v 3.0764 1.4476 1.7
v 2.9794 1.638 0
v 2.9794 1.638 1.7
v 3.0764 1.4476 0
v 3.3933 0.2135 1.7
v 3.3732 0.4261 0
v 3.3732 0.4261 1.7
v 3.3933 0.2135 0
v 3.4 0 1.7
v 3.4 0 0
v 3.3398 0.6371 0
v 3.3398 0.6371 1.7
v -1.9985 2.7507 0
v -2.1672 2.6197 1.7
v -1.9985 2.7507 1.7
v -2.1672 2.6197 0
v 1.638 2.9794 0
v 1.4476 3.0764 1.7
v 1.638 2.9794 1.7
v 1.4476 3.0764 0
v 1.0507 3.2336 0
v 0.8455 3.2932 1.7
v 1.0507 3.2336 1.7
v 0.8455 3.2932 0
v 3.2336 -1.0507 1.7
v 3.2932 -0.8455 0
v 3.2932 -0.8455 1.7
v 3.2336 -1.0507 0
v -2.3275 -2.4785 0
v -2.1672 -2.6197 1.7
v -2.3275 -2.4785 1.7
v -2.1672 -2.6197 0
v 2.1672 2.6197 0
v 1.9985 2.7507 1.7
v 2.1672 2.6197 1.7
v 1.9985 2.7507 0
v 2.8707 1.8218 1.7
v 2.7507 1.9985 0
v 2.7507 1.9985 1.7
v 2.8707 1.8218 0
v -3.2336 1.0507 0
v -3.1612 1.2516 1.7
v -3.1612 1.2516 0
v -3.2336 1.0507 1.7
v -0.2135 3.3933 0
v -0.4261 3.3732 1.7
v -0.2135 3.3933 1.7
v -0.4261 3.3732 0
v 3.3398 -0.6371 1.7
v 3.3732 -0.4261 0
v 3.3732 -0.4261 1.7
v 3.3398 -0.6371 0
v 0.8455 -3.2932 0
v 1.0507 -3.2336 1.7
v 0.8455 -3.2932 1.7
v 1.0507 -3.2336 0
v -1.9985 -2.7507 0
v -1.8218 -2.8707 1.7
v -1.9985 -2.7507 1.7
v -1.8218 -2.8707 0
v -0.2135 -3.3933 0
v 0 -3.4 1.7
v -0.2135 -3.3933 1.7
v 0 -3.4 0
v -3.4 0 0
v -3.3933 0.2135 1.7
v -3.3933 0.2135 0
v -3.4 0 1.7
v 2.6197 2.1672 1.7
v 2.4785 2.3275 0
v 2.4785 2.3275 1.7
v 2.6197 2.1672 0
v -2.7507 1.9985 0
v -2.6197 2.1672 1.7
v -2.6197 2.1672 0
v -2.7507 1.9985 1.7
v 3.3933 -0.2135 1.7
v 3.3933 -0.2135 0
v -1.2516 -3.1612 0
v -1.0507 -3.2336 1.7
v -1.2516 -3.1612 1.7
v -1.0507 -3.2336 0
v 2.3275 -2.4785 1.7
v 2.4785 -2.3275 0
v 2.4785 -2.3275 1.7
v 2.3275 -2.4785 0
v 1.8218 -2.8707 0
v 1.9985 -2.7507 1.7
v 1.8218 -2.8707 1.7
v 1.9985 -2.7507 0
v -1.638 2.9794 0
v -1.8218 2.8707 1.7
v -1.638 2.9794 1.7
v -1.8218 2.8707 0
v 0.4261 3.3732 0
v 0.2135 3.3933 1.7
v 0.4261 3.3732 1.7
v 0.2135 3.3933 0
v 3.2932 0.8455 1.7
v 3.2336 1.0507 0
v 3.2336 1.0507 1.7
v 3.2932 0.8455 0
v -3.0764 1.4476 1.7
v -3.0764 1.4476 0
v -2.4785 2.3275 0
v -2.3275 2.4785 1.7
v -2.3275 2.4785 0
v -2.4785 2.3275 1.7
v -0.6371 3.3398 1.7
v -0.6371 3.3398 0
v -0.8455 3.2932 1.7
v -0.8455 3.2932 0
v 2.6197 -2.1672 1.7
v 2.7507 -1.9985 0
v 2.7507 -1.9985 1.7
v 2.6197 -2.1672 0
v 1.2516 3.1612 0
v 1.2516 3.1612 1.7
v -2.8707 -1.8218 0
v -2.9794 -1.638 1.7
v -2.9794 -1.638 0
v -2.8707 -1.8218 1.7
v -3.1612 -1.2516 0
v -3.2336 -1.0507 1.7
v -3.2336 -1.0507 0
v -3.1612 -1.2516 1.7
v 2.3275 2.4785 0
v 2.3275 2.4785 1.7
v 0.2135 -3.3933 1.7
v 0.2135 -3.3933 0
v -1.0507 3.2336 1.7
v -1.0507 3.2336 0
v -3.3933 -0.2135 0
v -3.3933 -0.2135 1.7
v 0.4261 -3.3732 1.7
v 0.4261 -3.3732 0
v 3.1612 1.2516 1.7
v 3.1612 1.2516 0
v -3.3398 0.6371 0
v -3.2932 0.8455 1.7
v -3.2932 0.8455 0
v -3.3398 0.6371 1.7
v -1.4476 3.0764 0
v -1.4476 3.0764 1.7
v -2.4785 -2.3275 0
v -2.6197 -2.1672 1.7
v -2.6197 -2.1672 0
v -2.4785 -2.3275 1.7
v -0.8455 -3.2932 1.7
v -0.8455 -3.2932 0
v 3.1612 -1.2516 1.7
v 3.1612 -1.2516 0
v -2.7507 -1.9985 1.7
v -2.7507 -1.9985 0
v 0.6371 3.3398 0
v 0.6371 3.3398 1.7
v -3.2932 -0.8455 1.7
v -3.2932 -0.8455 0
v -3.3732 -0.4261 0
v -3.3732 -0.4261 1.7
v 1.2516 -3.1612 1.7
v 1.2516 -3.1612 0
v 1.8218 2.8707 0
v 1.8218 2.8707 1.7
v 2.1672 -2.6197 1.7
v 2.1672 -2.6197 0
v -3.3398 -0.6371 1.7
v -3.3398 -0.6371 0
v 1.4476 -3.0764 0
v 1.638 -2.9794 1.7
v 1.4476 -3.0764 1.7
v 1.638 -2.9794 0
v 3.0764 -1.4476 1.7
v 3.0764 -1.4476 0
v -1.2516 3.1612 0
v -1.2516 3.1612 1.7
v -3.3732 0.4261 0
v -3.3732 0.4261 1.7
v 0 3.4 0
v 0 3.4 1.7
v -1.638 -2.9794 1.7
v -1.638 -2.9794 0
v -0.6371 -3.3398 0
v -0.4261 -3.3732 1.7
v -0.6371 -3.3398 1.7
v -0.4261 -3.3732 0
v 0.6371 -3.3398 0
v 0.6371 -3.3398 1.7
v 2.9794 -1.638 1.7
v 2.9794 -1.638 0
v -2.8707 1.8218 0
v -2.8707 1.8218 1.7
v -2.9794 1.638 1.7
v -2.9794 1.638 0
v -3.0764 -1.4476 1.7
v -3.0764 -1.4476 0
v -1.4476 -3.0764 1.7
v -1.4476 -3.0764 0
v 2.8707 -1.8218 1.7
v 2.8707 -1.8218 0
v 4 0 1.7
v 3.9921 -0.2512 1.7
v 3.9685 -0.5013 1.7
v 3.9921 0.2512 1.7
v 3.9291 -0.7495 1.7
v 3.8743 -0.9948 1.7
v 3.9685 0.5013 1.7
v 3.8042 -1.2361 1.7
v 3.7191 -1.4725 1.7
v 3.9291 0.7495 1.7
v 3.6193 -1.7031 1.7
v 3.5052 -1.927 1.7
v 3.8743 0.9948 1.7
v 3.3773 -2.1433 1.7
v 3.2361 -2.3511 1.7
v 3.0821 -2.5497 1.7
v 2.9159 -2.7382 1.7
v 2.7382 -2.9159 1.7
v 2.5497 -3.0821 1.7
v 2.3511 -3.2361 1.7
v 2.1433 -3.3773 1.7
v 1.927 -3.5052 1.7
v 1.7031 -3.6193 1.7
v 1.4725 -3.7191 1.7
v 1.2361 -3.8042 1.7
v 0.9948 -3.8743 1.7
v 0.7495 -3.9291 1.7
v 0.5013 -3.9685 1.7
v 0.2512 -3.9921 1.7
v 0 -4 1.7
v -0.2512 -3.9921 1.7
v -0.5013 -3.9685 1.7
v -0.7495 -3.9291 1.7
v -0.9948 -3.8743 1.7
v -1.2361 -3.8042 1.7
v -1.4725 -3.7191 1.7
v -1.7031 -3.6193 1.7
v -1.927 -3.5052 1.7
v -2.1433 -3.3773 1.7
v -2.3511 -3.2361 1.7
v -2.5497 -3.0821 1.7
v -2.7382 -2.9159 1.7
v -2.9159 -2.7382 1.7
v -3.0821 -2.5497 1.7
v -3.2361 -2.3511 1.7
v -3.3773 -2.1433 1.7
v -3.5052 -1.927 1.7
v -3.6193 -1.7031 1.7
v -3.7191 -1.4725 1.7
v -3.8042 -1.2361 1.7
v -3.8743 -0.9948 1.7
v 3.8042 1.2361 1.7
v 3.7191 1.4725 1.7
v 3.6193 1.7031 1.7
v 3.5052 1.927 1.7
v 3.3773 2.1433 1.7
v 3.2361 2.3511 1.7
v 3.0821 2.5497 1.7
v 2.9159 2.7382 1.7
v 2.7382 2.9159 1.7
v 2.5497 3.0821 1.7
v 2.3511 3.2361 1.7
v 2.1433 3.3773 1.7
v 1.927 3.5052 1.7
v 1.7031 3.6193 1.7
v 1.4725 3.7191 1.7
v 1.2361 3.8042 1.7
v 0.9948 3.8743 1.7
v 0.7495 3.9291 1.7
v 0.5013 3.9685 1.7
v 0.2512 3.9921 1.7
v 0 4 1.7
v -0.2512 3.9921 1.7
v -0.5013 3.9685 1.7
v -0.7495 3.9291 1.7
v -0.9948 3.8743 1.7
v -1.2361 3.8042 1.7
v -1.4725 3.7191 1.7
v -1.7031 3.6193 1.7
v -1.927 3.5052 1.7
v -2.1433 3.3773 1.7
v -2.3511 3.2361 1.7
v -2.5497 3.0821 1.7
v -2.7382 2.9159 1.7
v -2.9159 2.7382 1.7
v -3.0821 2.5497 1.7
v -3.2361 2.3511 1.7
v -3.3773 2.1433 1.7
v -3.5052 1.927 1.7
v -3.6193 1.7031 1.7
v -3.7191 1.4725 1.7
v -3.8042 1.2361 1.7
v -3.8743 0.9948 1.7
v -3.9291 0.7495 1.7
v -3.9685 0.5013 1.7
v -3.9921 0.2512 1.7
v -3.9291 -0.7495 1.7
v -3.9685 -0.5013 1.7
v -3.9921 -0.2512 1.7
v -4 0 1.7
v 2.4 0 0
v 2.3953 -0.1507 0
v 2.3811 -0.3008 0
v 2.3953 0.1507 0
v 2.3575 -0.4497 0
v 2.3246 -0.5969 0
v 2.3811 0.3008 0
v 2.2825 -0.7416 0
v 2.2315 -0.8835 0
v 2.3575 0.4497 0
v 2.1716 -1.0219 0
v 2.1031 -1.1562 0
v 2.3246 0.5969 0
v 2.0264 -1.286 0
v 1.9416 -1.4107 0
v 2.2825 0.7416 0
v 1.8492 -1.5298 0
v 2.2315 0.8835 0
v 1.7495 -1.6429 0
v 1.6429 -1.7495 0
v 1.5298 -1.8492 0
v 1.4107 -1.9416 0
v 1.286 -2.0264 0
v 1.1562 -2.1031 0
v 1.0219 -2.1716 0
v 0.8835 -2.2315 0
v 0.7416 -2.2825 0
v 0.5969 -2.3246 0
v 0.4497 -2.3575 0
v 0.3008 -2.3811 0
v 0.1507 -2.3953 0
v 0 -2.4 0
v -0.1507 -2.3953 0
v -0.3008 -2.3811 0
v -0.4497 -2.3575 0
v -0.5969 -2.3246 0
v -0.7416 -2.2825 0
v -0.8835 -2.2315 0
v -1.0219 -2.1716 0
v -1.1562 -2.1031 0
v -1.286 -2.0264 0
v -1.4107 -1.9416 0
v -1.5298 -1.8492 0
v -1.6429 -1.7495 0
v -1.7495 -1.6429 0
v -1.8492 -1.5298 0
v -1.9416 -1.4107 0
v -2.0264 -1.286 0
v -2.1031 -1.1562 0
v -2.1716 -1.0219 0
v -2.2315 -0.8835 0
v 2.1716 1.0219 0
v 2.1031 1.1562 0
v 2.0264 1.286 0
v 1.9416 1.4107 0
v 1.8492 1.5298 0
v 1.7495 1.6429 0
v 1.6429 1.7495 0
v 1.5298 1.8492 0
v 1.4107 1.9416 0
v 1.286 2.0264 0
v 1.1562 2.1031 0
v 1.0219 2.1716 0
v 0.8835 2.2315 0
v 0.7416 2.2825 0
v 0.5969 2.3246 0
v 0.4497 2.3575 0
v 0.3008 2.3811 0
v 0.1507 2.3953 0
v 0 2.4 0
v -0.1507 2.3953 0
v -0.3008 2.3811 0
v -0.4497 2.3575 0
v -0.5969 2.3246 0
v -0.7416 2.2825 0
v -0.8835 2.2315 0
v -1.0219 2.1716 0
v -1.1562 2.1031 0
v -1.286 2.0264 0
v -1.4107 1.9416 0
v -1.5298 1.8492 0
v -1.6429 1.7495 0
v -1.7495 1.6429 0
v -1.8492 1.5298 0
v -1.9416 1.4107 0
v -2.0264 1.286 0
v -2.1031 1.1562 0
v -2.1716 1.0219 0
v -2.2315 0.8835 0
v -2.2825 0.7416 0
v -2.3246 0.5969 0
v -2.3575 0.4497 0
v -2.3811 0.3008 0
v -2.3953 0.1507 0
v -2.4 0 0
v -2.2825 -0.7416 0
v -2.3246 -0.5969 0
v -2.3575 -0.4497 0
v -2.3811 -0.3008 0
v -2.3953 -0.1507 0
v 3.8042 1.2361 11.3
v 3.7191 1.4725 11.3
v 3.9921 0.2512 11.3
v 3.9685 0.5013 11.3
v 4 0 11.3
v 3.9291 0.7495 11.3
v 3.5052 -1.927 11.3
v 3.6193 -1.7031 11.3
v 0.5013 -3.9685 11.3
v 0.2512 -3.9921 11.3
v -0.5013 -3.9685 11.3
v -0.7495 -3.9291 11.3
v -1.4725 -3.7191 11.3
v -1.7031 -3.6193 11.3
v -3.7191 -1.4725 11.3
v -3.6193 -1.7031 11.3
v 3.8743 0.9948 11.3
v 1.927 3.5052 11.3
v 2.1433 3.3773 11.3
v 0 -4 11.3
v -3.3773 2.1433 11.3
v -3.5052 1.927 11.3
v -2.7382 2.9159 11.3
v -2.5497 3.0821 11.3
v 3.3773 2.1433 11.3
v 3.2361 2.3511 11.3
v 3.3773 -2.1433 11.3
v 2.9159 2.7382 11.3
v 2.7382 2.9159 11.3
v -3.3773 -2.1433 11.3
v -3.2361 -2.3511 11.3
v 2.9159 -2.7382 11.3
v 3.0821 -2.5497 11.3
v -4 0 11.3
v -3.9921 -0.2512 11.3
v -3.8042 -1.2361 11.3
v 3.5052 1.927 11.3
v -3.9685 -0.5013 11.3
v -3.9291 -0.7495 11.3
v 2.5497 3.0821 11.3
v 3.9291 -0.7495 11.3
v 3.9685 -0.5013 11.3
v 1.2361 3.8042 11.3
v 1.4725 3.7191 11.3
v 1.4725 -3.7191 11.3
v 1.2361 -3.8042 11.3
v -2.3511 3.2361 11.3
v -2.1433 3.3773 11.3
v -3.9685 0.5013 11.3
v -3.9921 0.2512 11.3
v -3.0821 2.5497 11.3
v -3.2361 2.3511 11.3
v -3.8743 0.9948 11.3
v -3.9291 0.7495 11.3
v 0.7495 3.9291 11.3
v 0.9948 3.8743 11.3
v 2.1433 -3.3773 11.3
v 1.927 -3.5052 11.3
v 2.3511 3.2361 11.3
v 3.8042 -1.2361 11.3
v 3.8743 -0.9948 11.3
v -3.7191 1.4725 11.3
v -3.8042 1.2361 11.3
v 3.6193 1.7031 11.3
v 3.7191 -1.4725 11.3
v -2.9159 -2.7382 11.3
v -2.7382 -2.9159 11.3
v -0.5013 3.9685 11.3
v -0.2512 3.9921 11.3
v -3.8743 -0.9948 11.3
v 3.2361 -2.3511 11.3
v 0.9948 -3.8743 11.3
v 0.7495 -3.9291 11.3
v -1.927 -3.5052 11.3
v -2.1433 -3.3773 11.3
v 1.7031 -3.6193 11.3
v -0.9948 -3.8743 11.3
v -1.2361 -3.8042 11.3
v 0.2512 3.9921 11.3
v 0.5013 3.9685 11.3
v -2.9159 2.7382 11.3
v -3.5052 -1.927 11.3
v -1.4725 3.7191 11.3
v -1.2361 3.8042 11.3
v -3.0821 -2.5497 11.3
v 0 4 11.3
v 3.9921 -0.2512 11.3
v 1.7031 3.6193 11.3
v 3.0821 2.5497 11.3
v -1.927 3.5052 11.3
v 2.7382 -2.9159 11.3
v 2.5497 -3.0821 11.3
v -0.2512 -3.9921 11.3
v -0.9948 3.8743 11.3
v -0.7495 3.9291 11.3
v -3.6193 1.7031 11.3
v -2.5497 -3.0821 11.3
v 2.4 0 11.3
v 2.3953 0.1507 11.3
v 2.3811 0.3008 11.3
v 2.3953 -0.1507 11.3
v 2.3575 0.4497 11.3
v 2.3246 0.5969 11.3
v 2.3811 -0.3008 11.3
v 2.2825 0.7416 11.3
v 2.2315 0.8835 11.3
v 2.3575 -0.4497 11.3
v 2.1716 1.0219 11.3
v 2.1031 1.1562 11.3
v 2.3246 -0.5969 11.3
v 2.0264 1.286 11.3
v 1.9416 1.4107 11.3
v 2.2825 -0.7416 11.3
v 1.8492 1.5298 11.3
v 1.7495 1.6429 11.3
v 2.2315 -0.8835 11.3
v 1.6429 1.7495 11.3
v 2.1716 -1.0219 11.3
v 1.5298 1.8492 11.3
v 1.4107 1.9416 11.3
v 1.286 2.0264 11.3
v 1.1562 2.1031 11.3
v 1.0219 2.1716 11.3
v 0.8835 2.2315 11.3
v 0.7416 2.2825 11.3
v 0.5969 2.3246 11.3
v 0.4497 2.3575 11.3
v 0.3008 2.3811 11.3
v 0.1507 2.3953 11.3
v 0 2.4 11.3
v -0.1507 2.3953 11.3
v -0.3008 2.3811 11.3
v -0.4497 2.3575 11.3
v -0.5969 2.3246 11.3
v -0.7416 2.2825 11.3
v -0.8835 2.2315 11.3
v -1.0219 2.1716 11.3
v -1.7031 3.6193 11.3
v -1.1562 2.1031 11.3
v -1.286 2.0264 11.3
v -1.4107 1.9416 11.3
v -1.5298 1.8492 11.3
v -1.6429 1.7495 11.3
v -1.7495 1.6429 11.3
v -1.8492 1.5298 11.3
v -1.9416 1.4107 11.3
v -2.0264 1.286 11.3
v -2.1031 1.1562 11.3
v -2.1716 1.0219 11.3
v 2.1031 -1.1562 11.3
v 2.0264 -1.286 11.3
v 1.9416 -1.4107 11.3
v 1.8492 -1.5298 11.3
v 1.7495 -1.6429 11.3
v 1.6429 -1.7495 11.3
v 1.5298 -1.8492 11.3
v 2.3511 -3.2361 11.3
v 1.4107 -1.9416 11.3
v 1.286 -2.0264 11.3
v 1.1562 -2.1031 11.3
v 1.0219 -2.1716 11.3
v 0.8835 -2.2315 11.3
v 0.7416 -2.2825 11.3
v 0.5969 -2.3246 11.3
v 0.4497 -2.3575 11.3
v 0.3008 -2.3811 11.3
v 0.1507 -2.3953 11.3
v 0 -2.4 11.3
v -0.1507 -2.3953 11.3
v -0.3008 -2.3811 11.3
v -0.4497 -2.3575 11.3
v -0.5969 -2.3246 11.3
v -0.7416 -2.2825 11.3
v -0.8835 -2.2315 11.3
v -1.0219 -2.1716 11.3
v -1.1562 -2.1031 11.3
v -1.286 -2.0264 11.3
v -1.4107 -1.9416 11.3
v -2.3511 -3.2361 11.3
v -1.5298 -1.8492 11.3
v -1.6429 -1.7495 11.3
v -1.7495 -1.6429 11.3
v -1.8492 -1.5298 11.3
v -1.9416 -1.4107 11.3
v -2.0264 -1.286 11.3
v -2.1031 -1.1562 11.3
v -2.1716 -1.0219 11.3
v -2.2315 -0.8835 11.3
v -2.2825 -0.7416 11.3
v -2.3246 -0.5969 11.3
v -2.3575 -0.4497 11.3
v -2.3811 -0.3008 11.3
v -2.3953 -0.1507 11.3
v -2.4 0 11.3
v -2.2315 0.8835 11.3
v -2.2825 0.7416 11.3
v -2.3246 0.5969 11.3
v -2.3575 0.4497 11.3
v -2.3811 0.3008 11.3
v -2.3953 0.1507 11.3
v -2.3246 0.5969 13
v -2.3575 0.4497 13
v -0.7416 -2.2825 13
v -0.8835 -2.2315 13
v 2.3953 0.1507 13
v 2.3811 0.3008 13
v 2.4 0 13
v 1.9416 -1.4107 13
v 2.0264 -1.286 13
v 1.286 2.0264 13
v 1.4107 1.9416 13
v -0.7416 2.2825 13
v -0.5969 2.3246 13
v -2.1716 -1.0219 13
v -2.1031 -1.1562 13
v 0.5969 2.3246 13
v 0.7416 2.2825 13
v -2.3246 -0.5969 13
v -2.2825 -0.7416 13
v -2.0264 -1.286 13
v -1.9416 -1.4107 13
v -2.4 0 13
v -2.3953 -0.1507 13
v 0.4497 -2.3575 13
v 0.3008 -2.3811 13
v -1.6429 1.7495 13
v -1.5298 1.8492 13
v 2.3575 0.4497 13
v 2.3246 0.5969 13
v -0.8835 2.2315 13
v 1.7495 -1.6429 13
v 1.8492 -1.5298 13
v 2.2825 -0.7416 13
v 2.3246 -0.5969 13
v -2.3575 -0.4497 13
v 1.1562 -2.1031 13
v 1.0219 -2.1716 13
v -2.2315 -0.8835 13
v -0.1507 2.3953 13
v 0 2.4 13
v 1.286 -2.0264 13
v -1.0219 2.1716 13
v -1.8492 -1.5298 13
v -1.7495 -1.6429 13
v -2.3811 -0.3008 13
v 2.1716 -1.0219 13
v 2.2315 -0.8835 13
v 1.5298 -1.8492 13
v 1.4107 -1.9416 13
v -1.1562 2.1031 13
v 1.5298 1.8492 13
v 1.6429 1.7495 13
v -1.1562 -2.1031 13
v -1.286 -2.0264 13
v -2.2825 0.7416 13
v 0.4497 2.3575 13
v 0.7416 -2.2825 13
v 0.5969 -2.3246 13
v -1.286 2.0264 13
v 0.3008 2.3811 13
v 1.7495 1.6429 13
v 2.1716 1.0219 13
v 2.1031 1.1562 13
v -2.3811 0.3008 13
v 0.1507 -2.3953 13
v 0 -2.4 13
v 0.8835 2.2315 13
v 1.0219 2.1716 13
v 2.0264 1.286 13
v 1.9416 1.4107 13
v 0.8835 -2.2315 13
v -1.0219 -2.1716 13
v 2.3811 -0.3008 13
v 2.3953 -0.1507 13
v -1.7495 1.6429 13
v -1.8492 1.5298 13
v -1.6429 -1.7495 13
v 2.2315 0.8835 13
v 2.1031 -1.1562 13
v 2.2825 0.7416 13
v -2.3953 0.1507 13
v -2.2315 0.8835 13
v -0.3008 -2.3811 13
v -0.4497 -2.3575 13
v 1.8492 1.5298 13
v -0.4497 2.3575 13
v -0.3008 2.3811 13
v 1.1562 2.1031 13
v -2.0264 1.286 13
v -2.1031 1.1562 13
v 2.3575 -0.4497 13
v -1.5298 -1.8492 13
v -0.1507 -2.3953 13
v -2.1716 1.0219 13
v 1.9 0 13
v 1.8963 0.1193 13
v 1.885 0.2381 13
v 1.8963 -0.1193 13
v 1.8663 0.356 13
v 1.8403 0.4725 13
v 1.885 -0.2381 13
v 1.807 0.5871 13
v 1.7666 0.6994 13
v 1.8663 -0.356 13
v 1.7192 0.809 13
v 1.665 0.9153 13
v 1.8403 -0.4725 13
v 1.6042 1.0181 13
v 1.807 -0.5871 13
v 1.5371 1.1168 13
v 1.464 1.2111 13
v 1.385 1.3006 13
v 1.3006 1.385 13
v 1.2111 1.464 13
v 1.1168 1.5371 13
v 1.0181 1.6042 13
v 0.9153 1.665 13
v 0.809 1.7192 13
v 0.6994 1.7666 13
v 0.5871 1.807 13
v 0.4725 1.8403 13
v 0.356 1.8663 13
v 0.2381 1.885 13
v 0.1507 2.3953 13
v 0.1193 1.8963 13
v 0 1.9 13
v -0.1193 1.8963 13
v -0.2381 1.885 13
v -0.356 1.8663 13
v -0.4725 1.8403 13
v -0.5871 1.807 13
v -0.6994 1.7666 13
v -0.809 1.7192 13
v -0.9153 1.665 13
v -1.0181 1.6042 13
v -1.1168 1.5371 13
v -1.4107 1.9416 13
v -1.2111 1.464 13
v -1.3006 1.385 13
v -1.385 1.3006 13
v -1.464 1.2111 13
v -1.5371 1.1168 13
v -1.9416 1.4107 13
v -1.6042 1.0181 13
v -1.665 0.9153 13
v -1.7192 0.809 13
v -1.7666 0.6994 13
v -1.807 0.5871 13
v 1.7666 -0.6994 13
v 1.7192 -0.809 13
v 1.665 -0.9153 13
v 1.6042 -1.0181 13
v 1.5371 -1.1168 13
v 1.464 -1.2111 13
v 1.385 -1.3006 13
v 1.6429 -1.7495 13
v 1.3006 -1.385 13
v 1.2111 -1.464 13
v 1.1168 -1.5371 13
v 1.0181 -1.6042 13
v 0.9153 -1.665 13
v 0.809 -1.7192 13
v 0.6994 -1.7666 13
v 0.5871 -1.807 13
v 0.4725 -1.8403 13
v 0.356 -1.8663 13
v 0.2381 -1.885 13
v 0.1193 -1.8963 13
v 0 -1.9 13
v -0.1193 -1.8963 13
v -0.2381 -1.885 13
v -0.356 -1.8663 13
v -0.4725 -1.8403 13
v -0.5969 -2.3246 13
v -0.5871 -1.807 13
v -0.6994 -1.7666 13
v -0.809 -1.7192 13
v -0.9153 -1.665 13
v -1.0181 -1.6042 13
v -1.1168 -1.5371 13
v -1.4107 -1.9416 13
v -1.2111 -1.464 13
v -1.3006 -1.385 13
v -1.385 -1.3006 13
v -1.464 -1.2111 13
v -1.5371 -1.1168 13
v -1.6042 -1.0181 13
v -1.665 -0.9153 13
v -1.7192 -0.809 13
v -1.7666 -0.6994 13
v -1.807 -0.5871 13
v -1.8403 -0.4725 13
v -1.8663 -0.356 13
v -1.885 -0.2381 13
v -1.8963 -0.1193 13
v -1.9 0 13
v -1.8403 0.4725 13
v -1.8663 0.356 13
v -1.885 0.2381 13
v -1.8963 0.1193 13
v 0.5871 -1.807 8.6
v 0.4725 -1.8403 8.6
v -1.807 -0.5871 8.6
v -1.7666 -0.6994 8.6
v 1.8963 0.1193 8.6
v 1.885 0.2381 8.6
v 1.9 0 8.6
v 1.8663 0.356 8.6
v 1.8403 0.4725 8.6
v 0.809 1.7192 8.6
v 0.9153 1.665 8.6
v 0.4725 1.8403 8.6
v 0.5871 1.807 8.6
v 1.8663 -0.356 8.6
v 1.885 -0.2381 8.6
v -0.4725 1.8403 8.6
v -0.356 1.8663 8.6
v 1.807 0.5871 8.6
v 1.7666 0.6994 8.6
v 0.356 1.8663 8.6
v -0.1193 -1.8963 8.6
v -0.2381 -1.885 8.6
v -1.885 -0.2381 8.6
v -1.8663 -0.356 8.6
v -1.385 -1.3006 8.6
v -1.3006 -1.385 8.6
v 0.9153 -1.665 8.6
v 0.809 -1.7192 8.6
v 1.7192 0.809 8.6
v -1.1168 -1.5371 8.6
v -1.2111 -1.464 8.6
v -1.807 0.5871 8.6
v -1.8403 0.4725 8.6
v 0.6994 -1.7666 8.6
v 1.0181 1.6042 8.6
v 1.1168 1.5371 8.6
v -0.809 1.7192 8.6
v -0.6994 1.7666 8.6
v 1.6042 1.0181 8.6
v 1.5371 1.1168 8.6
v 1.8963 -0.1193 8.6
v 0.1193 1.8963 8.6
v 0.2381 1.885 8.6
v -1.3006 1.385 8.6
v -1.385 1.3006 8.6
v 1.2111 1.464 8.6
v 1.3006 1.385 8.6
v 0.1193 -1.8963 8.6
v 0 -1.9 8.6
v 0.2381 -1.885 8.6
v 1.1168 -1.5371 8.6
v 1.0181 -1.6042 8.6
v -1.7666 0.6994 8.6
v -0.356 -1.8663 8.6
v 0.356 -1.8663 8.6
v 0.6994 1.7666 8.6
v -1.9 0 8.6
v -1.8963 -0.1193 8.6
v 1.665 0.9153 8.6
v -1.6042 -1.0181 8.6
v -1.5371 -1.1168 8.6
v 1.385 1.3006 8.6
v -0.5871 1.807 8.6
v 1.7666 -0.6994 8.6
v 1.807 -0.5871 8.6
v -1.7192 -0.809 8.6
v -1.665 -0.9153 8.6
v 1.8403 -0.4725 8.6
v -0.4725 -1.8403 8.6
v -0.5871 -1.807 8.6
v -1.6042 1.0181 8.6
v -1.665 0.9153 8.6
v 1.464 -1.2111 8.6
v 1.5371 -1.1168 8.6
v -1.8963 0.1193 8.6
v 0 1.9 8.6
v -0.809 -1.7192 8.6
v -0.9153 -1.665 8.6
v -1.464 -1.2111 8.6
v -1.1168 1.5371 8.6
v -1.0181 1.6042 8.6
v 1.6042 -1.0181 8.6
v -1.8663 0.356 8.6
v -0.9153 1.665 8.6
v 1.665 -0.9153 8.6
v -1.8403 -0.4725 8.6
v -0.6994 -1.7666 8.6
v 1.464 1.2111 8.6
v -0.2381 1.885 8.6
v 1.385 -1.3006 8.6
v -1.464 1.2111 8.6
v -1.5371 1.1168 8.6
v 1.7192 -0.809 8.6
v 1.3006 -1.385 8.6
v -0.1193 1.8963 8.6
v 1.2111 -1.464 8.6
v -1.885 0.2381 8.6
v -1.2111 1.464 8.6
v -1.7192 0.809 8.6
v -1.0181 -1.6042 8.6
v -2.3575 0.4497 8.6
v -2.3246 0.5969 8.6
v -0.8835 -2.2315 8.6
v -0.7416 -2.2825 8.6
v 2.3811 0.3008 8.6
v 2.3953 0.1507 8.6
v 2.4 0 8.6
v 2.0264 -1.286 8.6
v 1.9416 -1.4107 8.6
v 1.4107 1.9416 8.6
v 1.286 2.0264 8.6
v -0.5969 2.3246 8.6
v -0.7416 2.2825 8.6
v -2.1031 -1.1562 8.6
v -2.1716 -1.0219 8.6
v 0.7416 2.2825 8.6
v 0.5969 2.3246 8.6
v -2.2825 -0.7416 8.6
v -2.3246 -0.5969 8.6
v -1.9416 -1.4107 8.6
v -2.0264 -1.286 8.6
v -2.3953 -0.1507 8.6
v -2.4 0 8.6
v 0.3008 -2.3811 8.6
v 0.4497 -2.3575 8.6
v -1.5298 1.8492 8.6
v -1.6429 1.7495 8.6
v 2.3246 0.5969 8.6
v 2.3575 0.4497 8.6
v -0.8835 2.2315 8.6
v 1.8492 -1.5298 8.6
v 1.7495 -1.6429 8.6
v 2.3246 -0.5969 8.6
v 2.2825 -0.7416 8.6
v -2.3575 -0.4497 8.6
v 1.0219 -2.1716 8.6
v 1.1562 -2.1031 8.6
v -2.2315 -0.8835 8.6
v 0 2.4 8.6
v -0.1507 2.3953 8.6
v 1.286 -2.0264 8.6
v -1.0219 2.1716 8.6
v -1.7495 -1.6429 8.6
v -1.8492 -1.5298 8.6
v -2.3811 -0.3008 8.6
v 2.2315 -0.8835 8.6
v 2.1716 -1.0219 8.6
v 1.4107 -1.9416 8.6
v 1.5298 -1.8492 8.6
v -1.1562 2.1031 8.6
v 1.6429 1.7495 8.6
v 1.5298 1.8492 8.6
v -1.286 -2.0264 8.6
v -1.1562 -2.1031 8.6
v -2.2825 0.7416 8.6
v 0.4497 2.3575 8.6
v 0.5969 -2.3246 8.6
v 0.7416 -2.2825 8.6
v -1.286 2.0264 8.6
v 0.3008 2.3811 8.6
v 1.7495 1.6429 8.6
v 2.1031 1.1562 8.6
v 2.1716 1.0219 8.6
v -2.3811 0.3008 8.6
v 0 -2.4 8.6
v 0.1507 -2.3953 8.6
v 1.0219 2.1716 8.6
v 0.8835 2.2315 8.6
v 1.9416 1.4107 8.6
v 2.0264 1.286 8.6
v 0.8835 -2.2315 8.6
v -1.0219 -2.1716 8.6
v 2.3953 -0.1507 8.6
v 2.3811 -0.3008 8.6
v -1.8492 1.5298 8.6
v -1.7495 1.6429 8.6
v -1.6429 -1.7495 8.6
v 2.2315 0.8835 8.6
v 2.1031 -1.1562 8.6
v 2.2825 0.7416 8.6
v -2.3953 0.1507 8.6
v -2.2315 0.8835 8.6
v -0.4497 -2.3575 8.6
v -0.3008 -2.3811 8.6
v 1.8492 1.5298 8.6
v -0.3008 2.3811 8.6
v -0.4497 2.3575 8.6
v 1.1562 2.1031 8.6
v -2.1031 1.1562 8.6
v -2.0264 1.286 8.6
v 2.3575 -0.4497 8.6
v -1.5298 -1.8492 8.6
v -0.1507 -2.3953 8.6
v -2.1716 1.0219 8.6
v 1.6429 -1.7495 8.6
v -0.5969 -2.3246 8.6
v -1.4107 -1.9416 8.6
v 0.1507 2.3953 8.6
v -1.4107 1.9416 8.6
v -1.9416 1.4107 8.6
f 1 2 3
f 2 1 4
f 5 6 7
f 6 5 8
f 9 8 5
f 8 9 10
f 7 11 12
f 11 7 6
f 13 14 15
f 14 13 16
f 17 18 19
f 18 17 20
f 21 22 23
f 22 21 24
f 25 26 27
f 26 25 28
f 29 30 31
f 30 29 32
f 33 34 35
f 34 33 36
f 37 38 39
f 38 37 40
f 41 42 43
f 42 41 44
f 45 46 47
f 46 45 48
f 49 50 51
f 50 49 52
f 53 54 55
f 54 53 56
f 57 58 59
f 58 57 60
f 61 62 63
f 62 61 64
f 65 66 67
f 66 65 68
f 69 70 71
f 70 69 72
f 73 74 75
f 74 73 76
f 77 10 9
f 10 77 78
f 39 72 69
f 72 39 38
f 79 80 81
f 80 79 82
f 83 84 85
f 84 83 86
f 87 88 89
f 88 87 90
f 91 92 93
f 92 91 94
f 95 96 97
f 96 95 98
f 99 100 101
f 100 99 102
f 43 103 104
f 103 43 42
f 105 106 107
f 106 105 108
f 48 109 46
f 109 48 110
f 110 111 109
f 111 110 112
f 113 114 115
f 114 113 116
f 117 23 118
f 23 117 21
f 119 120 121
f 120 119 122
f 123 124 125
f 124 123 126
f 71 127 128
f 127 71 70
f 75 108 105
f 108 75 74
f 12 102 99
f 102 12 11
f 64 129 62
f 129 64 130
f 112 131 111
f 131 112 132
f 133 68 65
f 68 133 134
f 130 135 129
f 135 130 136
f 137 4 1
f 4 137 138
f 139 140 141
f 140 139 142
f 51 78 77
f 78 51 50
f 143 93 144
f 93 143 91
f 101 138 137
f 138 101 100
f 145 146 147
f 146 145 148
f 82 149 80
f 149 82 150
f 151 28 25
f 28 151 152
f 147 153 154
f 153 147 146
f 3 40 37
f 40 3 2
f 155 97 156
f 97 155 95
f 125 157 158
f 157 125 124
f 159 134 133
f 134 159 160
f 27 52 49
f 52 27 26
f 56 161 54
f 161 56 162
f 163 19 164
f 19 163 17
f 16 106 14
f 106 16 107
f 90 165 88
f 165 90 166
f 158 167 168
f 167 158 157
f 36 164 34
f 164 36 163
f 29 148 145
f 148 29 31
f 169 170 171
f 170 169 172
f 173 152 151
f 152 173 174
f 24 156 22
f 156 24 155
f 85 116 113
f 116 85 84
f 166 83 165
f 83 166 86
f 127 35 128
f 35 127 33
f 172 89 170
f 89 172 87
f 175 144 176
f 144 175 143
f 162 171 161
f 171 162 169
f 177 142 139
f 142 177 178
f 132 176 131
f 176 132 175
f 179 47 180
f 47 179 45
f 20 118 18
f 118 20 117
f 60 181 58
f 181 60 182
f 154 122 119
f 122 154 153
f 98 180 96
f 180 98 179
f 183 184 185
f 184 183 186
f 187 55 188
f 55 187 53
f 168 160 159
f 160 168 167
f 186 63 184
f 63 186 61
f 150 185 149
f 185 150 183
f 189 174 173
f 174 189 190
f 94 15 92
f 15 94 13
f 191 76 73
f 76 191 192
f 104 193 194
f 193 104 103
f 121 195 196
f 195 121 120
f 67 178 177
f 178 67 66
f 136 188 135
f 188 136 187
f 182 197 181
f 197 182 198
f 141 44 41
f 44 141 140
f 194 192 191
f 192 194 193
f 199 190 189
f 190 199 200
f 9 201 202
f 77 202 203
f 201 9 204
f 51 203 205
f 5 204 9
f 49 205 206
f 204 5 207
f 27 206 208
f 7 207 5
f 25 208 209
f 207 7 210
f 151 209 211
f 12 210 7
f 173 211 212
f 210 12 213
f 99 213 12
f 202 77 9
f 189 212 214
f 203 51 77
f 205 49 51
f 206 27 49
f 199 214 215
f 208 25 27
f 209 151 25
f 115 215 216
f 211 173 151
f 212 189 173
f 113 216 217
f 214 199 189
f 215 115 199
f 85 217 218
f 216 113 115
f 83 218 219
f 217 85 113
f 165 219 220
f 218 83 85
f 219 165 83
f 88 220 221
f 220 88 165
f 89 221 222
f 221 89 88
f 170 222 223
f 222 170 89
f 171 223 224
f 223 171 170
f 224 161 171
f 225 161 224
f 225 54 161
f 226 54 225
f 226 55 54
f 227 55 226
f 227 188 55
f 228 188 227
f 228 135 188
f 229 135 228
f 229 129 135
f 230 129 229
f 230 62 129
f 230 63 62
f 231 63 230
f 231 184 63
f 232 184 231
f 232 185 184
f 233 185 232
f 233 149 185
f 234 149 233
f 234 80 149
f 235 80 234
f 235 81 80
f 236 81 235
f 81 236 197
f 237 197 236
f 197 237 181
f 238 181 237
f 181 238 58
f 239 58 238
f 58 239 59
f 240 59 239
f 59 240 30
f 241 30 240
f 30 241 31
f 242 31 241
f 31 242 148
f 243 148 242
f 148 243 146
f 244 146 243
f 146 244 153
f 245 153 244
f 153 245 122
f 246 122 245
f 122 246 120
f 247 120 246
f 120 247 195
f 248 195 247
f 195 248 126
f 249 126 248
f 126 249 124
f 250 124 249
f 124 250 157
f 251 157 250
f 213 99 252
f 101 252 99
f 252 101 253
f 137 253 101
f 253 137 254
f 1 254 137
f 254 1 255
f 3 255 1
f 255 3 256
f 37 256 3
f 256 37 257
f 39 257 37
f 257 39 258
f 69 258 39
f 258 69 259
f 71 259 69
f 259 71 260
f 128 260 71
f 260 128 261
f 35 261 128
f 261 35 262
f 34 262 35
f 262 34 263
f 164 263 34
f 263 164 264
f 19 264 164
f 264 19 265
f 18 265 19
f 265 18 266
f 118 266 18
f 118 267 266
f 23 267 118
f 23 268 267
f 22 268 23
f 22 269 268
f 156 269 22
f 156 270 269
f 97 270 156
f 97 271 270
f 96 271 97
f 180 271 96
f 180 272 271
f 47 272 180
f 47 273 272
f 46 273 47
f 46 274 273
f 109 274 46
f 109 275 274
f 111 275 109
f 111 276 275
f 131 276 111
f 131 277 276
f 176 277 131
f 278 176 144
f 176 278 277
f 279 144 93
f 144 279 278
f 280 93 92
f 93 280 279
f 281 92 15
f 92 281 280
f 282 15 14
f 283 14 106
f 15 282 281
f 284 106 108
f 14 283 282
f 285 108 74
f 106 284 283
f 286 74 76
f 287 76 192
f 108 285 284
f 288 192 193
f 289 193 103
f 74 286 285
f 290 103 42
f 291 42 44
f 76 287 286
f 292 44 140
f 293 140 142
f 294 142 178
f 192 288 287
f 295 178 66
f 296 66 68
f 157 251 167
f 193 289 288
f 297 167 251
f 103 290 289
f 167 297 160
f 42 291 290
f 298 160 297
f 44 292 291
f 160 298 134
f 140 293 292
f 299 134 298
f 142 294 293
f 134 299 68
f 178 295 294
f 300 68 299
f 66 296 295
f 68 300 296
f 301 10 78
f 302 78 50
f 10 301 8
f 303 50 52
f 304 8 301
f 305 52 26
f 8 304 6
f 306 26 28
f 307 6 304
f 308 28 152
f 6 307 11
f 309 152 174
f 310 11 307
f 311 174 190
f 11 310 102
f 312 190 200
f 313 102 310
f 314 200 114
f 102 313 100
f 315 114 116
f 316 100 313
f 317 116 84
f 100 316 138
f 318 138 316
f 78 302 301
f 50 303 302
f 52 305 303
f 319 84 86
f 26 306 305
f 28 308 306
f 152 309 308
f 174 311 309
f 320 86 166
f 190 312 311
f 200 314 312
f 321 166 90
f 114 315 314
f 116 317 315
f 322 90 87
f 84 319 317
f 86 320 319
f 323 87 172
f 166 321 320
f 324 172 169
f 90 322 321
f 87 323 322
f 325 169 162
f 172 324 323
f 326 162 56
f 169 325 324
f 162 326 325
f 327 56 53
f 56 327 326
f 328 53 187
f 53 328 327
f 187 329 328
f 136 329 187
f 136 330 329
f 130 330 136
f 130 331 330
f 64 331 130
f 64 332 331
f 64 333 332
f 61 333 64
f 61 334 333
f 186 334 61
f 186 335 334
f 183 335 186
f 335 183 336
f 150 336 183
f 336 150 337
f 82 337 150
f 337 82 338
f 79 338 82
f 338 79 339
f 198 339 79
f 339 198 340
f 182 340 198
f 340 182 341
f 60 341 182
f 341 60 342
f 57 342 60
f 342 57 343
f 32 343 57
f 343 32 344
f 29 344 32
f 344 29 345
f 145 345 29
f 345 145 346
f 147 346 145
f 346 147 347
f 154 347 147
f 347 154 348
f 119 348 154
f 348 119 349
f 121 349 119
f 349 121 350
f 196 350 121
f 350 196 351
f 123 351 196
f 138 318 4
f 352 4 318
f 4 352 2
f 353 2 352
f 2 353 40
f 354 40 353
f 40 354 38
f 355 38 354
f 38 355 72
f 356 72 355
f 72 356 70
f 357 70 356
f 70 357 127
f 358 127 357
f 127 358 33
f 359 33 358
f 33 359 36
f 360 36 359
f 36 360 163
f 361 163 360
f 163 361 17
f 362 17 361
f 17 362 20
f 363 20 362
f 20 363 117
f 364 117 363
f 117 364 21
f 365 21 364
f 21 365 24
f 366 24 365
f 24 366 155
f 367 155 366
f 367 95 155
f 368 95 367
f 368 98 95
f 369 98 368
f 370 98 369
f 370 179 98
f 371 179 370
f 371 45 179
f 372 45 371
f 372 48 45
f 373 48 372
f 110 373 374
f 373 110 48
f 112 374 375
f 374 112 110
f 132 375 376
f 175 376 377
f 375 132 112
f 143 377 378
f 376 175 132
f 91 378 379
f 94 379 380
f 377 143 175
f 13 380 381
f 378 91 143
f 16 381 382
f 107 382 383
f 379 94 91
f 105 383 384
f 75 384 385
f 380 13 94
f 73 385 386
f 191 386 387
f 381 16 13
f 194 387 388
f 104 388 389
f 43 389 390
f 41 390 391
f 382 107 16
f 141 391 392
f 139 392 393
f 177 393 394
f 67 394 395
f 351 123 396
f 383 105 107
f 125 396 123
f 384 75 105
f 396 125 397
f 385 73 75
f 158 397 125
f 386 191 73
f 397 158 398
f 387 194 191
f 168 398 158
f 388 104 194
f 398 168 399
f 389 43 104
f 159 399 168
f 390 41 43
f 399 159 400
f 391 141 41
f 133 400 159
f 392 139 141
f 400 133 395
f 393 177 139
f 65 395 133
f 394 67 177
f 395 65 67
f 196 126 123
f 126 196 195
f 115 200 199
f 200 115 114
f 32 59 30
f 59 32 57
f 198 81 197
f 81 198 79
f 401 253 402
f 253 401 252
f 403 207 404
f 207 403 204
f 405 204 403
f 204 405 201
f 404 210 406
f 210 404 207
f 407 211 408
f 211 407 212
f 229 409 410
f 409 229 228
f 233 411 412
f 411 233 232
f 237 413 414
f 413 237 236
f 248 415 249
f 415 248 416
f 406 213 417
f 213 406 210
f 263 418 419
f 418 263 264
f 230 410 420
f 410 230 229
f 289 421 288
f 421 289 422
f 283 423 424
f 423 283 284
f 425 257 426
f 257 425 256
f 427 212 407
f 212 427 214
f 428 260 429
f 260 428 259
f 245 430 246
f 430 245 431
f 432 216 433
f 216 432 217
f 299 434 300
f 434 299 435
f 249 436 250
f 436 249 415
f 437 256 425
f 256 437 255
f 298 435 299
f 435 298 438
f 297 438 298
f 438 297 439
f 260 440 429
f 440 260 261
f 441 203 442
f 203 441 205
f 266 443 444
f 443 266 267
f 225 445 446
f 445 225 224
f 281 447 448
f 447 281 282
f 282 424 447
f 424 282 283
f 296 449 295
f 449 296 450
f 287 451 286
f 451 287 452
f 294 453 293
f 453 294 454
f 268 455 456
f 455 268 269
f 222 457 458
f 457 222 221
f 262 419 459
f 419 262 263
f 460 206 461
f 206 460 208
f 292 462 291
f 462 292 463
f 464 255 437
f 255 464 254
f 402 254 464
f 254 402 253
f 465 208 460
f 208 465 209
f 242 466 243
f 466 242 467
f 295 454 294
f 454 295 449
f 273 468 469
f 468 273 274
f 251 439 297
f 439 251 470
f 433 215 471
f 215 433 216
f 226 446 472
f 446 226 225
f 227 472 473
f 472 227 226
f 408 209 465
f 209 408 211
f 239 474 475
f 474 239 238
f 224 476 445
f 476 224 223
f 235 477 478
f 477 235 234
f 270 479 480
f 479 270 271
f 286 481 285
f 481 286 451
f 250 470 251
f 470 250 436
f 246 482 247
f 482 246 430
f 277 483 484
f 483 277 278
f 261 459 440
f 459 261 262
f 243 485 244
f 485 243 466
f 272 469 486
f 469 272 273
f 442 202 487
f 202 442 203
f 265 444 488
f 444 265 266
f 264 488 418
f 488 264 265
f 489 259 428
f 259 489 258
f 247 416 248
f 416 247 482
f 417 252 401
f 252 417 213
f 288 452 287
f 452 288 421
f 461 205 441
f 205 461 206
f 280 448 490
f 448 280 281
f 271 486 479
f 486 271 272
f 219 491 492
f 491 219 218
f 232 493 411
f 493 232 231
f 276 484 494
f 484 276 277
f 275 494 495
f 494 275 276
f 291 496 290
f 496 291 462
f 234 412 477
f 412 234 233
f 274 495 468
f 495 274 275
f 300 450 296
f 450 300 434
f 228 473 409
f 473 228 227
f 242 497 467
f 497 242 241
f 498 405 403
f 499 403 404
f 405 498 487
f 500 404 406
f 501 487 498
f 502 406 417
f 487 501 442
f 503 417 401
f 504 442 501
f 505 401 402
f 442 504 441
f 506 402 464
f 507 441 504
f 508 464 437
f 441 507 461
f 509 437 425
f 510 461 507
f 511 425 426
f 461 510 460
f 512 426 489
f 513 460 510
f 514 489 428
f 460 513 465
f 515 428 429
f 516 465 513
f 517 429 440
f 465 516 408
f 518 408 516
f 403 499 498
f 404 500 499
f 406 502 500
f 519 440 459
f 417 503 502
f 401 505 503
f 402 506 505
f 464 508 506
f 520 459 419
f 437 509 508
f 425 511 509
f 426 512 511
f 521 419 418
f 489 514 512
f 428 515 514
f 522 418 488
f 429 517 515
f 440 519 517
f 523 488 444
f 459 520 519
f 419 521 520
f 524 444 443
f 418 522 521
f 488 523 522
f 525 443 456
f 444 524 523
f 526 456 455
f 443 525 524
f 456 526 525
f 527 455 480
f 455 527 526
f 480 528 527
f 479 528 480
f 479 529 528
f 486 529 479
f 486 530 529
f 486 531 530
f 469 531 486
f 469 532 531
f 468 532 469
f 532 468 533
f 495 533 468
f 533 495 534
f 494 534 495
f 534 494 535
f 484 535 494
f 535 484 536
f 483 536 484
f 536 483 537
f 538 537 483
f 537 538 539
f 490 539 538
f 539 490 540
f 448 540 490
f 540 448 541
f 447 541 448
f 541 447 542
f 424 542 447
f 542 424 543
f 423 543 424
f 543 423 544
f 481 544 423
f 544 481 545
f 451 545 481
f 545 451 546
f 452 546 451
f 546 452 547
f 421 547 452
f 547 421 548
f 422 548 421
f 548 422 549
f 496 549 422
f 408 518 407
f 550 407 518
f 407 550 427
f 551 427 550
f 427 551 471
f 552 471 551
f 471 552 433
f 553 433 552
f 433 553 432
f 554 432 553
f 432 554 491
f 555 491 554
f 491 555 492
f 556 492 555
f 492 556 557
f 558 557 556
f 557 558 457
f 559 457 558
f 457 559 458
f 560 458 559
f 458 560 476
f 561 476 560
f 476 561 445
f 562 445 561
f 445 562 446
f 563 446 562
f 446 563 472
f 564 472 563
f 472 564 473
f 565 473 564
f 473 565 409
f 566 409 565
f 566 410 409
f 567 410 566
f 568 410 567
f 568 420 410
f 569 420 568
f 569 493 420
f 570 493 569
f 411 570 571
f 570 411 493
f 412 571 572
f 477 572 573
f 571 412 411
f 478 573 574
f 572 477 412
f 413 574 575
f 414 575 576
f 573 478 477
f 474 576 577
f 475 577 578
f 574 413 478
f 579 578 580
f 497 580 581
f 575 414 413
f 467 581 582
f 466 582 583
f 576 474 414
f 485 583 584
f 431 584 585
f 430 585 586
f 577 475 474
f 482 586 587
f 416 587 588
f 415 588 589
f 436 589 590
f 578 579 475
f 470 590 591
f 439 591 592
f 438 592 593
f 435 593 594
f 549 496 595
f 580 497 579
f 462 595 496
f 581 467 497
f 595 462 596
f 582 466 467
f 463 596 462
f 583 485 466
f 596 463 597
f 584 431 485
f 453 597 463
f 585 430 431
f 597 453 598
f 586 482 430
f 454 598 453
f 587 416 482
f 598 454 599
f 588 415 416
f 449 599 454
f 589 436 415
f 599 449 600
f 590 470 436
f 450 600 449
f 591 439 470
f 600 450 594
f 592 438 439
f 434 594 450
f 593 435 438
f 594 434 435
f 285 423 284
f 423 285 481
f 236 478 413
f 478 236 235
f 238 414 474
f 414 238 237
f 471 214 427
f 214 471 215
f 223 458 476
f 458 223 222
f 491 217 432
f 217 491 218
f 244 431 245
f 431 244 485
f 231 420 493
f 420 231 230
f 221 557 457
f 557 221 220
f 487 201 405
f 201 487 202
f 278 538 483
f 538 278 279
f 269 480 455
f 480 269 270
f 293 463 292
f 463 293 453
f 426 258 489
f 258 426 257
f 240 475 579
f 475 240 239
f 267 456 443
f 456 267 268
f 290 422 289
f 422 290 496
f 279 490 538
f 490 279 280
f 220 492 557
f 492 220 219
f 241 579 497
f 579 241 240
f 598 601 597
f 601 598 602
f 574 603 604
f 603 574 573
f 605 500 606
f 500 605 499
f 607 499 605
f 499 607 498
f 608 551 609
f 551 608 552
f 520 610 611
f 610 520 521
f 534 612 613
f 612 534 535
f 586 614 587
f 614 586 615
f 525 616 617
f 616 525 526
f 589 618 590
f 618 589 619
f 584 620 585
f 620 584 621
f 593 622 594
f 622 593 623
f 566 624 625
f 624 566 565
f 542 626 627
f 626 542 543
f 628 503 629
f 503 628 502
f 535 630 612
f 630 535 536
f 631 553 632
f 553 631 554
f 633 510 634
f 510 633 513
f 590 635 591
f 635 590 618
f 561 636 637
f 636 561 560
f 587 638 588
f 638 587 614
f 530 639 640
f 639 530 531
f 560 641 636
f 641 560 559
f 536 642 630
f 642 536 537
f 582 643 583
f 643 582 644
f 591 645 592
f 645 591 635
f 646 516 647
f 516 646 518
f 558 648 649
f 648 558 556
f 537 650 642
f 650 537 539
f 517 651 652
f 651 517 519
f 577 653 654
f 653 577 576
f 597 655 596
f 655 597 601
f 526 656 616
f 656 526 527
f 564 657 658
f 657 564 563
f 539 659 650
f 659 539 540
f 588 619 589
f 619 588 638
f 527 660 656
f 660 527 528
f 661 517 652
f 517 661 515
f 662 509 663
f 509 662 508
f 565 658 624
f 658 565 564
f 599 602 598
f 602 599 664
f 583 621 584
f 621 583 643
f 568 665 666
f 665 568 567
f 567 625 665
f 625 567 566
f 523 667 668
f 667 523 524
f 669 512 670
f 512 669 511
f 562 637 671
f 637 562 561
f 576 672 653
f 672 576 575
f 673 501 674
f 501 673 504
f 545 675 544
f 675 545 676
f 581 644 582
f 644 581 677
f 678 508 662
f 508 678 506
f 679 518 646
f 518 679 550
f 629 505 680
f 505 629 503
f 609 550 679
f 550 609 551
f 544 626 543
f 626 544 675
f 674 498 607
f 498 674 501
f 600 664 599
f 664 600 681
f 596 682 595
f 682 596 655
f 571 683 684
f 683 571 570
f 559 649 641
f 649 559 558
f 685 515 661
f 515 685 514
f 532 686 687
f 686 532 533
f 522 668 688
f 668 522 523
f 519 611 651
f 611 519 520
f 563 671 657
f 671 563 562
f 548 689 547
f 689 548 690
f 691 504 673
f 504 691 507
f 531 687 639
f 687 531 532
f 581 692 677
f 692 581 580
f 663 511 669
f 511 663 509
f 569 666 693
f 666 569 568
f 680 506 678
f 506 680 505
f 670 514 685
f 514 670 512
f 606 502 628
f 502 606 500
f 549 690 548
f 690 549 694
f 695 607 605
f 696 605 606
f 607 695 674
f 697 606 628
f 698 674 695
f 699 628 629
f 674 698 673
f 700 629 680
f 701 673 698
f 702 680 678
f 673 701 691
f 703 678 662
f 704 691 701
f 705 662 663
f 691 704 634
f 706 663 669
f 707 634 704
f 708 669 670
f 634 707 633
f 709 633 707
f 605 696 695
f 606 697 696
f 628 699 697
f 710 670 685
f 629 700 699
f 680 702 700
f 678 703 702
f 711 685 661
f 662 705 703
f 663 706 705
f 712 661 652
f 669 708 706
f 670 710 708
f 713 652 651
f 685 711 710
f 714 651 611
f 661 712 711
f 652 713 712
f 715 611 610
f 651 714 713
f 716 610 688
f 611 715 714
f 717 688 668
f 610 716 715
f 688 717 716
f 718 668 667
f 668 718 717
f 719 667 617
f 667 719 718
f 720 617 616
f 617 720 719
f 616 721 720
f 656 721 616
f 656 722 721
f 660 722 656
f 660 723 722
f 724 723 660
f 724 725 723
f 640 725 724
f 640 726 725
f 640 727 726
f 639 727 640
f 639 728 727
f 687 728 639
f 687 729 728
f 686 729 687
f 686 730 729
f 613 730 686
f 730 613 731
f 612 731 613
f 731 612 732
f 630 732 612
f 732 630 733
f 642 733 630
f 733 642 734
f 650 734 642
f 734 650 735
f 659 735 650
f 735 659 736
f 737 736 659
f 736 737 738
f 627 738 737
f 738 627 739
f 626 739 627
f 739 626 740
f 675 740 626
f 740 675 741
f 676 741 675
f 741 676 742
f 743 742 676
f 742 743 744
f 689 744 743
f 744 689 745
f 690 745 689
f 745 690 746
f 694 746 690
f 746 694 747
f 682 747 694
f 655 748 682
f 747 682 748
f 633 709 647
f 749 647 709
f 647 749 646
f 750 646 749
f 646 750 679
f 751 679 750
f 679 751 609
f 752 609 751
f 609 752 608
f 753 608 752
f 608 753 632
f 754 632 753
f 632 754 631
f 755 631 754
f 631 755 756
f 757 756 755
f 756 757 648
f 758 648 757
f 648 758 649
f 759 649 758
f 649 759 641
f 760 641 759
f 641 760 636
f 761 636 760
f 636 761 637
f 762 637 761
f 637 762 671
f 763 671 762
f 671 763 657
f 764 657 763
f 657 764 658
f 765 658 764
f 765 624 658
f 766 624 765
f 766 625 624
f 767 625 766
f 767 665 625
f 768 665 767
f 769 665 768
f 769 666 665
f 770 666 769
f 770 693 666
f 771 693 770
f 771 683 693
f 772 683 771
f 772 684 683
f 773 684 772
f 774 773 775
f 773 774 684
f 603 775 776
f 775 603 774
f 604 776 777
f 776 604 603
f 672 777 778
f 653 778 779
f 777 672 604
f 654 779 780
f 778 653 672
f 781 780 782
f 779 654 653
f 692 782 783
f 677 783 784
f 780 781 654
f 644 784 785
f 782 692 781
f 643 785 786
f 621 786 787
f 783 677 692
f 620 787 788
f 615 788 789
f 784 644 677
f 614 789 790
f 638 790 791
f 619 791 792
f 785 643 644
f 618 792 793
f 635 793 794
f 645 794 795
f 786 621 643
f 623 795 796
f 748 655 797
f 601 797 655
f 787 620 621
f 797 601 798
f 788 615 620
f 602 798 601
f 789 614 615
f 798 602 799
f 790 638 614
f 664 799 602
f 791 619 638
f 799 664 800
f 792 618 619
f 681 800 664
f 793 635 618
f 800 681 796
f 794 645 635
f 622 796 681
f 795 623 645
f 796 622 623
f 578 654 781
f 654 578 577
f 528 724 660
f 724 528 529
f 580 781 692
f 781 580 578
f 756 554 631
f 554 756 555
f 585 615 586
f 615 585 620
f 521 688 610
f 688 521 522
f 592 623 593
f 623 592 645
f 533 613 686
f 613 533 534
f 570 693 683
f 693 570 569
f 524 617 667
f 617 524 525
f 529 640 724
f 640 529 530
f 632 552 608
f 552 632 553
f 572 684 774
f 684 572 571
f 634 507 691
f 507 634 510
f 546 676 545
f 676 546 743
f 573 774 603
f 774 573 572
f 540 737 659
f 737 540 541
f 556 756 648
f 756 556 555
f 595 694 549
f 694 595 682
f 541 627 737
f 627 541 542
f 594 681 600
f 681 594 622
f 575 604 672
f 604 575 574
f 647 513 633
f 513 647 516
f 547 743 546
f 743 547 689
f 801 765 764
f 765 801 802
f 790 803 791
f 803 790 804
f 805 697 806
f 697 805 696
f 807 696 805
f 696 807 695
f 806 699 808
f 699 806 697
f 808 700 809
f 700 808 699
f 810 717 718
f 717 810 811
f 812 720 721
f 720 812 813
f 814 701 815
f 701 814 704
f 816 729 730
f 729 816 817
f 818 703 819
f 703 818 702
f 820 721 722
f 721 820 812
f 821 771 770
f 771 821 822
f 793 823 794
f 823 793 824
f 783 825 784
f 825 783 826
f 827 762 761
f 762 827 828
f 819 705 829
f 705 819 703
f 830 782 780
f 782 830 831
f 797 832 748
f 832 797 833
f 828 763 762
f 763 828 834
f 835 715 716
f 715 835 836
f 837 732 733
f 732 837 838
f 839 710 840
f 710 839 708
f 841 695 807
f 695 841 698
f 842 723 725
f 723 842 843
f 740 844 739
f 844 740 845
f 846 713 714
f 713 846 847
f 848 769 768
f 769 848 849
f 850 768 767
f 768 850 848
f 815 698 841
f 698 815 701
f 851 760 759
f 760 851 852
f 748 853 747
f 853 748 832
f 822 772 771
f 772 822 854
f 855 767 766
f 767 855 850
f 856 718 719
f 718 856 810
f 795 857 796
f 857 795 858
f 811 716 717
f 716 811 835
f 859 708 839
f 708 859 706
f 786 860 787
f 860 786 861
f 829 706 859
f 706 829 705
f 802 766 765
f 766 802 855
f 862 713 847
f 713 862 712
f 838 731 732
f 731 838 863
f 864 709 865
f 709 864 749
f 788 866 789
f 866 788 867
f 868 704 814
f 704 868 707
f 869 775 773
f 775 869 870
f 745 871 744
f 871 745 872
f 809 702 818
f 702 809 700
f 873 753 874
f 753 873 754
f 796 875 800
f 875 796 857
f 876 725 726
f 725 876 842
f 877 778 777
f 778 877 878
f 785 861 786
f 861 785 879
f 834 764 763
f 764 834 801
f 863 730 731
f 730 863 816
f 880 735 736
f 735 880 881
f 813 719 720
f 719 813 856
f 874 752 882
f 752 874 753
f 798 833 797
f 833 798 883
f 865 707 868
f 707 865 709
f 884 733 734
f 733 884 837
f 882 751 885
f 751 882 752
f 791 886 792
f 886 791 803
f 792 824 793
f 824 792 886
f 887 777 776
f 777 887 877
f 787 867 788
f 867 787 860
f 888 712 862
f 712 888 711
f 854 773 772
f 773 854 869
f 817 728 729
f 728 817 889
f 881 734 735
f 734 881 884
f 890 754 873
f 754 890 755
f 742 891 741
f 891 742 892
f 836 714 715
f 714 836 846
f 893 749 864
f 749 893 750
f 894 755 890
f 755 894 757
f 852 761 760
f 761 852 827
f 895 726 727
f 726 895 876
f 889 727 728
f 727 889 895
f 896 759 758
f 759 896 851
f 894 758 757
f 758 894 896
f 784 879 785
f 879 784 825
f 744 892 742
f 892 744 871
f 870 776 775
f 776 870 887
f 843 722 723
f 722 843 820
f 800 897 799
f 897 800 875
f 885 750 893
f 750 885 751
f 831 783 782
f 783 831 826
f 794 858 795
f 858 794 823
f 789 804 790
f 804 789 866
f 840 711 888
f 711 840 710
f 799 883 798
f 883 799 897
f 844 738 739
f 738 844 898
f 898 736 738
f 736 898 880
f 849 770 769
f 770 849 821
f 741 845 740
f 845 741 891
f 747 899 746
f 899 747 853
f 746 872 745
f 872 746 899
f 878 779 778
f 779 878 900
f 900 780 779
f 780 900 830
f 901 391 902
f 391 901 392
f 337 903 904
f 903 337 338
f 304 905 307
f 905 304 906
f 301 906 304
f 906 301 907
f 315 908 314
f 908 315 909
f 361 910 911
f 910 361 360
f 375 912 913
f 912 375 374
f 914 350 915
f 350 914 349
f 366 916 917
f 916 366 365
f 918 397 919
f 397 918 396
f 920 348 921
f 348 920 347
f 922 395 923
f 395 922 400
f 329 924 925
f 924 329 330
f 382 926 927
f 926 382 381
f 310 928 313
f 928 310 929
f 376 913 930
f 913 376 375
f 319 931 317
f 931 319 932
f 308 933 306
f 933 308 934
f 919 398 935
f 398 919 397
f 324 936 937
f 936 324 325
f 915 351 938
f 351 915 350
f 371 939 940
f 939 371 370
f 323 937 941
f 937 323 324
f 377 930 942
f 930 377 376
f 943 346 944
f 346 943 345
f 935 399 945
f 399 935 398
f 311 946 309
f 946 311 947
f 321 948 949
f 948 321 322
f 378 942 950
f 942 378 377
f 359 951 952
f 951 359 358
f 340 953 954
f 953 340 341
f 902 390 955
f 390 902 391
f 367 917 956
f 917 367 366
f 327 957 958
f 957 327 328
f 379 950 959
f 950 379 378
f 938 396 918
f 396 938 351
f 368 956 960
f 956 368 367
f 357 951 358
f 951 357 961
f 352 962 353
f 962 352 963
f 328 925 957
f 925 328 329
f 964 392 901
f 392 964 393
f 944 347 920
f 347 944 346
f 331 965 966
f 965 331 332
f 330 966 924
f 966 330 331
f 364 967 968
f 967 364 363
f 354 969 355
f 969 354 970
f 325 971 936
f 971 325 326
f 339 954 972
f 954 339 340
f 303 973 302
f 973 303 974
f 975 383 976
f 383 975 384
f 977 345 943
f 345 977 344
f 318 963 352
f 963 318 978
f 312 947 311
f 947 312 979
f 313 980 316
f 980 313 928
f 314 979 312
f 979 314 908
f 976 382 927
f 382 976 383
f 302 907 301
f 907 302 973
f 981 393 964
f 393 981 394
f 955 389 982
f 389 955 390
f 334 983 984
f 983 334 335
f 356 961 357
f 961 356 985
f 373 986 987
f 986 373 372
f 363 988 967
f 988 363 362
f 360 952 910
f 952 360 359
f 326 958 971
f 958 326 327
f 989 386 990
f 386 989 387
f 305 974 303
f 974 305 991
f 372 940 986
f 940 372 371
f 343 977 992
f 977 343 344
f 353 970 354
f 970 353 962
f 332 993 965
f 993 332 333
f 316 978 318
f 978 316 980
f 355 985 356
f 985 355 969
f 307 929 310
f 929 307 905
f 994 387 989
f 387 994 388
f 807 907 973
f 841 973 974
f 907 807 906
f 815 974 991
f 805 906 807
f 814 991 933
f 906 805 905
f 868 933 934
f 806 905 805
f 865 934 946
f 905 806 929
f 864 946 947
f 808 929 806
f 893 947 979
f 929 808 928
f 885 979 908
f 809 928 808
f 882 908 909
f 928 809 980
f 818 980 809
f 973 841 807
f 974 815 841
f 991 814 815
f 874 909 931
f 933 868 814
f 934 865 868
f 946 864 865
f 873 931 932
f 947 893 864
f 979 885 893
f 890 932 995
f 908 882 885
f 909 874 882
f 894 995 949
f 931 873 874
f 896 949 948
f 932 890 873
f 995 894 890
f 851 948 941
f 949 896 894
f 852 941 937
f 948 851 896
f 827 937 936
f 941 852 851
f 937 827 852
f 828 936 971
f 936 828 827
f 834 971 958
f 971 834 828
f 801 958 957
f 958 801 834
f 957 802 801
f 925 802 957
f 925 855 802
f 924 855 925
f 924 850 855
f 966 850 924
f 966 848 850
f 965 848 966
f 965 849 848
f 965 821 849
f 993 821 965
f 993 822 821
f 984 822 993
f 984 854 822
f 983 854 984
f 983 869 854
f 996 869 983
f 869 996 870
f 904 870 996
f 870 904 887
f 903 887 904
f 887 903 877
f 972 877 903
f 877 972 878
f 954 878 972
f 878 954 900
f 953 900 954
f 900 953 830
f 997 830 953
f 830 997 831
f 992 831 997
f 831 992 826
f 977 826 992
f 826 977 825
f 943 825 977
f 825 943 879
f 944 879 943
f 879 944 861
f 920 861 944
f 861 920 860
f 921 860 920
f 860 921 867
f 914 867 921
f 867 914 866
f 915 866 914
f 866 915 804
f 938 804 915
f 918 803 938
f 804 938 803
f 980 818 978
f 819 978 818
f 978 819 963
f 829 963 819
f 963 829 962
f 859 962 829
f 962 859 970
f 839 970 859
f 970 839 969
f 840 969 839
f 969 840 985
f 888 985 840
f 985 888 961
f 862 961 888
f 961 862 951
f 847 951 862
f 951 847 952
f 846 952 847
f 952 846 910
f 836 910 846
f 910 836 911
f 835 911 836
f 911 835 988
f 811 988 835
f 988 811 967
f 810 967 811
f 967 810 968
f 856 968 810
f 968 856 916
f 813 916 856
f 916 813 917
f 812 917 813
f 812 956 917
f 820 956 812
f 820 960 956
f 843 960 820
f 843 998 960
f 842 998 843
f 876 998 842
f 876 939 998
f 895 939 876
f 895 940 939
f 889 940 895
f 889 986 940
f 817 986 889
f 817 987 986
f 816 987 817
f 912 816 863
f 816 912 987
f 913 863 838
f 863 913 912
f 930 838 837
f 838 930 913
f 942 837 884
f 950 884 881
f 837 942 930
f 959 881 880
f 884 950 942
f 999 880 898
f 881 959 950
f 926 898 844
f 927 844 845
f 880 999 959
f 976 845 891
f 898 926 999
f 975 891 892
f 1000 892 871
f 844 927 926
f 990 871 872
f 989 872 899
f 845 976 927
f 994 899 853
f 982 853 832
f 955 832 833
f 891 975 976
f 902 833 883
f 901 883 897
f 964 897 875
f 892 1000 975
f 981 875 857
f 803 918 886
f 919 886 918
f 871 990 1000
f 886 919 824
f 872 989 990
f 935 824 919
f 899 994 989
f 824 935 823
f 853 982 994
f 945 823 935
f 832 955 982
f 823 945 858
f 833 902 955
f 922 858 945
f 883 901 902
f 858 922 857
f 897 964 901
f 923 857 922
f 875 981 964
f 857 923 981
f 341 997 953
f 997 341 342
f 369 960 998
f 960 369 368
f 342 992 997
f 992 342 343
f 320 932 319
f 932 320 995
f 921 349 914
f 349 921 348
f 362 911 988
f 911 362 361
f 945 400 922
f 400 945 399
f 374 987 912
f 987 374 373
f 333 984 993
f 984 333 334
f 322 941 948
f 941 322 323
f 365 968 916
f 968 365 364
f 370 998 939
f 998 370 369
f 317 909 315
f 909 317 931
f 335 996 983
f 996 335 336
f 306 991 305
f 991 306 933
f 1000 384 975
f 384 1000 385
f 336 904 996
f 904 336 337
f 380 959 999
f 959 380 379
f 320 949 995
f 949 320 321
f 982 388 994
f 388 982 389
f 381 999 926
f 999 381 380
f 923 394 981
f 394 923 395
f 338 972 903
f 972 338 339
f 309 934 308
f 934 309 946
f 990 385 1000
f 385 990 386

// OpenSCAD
/* [Brick settings] */
//Brick diameter
lego_diam = 8.0;
//Height of entire brick
lego_height = 13;

/* [Pin Settings] */
//Height of pin
pin_height = 1.7;
//Diameter of pin
pin_diam = 4.8;
//Diameter addition for pin Hole (bottom)
pin_diff = 1.0;

/* [Hidden] */
//This tells OpenScad to make the circle really round
$fn = 100;
pin_rad = pin_diam / 2;
lego_rad = lego_diam / 2;
hole_rad = pin_rad-pin_diff/2;
hole_rad2 = pin_rad;

difference()
{
union()
{
    cylinder(pin_height, pin_rad+pin_diff, pin_rad+pin_diff);
    translate([0,0,pin_height])
        cylinder(lego_height-pin_height*2, lego_rad, lego_rad);
    translate([0,0,lego_height-pin_height])
        cylinder(pin_height, pin_rad, pin_rad);
}
translate([0,0,-1])
//Two pins, lego height + 2 to make sure the hole exceeds the model
    cylinder(pin_height*2+lego_height+2, hole_rad, hole_rad);
translate([0,0,-1])
    cylinder(lego_height-pin_height*2, hole_rad2, hole_rad2);
}
